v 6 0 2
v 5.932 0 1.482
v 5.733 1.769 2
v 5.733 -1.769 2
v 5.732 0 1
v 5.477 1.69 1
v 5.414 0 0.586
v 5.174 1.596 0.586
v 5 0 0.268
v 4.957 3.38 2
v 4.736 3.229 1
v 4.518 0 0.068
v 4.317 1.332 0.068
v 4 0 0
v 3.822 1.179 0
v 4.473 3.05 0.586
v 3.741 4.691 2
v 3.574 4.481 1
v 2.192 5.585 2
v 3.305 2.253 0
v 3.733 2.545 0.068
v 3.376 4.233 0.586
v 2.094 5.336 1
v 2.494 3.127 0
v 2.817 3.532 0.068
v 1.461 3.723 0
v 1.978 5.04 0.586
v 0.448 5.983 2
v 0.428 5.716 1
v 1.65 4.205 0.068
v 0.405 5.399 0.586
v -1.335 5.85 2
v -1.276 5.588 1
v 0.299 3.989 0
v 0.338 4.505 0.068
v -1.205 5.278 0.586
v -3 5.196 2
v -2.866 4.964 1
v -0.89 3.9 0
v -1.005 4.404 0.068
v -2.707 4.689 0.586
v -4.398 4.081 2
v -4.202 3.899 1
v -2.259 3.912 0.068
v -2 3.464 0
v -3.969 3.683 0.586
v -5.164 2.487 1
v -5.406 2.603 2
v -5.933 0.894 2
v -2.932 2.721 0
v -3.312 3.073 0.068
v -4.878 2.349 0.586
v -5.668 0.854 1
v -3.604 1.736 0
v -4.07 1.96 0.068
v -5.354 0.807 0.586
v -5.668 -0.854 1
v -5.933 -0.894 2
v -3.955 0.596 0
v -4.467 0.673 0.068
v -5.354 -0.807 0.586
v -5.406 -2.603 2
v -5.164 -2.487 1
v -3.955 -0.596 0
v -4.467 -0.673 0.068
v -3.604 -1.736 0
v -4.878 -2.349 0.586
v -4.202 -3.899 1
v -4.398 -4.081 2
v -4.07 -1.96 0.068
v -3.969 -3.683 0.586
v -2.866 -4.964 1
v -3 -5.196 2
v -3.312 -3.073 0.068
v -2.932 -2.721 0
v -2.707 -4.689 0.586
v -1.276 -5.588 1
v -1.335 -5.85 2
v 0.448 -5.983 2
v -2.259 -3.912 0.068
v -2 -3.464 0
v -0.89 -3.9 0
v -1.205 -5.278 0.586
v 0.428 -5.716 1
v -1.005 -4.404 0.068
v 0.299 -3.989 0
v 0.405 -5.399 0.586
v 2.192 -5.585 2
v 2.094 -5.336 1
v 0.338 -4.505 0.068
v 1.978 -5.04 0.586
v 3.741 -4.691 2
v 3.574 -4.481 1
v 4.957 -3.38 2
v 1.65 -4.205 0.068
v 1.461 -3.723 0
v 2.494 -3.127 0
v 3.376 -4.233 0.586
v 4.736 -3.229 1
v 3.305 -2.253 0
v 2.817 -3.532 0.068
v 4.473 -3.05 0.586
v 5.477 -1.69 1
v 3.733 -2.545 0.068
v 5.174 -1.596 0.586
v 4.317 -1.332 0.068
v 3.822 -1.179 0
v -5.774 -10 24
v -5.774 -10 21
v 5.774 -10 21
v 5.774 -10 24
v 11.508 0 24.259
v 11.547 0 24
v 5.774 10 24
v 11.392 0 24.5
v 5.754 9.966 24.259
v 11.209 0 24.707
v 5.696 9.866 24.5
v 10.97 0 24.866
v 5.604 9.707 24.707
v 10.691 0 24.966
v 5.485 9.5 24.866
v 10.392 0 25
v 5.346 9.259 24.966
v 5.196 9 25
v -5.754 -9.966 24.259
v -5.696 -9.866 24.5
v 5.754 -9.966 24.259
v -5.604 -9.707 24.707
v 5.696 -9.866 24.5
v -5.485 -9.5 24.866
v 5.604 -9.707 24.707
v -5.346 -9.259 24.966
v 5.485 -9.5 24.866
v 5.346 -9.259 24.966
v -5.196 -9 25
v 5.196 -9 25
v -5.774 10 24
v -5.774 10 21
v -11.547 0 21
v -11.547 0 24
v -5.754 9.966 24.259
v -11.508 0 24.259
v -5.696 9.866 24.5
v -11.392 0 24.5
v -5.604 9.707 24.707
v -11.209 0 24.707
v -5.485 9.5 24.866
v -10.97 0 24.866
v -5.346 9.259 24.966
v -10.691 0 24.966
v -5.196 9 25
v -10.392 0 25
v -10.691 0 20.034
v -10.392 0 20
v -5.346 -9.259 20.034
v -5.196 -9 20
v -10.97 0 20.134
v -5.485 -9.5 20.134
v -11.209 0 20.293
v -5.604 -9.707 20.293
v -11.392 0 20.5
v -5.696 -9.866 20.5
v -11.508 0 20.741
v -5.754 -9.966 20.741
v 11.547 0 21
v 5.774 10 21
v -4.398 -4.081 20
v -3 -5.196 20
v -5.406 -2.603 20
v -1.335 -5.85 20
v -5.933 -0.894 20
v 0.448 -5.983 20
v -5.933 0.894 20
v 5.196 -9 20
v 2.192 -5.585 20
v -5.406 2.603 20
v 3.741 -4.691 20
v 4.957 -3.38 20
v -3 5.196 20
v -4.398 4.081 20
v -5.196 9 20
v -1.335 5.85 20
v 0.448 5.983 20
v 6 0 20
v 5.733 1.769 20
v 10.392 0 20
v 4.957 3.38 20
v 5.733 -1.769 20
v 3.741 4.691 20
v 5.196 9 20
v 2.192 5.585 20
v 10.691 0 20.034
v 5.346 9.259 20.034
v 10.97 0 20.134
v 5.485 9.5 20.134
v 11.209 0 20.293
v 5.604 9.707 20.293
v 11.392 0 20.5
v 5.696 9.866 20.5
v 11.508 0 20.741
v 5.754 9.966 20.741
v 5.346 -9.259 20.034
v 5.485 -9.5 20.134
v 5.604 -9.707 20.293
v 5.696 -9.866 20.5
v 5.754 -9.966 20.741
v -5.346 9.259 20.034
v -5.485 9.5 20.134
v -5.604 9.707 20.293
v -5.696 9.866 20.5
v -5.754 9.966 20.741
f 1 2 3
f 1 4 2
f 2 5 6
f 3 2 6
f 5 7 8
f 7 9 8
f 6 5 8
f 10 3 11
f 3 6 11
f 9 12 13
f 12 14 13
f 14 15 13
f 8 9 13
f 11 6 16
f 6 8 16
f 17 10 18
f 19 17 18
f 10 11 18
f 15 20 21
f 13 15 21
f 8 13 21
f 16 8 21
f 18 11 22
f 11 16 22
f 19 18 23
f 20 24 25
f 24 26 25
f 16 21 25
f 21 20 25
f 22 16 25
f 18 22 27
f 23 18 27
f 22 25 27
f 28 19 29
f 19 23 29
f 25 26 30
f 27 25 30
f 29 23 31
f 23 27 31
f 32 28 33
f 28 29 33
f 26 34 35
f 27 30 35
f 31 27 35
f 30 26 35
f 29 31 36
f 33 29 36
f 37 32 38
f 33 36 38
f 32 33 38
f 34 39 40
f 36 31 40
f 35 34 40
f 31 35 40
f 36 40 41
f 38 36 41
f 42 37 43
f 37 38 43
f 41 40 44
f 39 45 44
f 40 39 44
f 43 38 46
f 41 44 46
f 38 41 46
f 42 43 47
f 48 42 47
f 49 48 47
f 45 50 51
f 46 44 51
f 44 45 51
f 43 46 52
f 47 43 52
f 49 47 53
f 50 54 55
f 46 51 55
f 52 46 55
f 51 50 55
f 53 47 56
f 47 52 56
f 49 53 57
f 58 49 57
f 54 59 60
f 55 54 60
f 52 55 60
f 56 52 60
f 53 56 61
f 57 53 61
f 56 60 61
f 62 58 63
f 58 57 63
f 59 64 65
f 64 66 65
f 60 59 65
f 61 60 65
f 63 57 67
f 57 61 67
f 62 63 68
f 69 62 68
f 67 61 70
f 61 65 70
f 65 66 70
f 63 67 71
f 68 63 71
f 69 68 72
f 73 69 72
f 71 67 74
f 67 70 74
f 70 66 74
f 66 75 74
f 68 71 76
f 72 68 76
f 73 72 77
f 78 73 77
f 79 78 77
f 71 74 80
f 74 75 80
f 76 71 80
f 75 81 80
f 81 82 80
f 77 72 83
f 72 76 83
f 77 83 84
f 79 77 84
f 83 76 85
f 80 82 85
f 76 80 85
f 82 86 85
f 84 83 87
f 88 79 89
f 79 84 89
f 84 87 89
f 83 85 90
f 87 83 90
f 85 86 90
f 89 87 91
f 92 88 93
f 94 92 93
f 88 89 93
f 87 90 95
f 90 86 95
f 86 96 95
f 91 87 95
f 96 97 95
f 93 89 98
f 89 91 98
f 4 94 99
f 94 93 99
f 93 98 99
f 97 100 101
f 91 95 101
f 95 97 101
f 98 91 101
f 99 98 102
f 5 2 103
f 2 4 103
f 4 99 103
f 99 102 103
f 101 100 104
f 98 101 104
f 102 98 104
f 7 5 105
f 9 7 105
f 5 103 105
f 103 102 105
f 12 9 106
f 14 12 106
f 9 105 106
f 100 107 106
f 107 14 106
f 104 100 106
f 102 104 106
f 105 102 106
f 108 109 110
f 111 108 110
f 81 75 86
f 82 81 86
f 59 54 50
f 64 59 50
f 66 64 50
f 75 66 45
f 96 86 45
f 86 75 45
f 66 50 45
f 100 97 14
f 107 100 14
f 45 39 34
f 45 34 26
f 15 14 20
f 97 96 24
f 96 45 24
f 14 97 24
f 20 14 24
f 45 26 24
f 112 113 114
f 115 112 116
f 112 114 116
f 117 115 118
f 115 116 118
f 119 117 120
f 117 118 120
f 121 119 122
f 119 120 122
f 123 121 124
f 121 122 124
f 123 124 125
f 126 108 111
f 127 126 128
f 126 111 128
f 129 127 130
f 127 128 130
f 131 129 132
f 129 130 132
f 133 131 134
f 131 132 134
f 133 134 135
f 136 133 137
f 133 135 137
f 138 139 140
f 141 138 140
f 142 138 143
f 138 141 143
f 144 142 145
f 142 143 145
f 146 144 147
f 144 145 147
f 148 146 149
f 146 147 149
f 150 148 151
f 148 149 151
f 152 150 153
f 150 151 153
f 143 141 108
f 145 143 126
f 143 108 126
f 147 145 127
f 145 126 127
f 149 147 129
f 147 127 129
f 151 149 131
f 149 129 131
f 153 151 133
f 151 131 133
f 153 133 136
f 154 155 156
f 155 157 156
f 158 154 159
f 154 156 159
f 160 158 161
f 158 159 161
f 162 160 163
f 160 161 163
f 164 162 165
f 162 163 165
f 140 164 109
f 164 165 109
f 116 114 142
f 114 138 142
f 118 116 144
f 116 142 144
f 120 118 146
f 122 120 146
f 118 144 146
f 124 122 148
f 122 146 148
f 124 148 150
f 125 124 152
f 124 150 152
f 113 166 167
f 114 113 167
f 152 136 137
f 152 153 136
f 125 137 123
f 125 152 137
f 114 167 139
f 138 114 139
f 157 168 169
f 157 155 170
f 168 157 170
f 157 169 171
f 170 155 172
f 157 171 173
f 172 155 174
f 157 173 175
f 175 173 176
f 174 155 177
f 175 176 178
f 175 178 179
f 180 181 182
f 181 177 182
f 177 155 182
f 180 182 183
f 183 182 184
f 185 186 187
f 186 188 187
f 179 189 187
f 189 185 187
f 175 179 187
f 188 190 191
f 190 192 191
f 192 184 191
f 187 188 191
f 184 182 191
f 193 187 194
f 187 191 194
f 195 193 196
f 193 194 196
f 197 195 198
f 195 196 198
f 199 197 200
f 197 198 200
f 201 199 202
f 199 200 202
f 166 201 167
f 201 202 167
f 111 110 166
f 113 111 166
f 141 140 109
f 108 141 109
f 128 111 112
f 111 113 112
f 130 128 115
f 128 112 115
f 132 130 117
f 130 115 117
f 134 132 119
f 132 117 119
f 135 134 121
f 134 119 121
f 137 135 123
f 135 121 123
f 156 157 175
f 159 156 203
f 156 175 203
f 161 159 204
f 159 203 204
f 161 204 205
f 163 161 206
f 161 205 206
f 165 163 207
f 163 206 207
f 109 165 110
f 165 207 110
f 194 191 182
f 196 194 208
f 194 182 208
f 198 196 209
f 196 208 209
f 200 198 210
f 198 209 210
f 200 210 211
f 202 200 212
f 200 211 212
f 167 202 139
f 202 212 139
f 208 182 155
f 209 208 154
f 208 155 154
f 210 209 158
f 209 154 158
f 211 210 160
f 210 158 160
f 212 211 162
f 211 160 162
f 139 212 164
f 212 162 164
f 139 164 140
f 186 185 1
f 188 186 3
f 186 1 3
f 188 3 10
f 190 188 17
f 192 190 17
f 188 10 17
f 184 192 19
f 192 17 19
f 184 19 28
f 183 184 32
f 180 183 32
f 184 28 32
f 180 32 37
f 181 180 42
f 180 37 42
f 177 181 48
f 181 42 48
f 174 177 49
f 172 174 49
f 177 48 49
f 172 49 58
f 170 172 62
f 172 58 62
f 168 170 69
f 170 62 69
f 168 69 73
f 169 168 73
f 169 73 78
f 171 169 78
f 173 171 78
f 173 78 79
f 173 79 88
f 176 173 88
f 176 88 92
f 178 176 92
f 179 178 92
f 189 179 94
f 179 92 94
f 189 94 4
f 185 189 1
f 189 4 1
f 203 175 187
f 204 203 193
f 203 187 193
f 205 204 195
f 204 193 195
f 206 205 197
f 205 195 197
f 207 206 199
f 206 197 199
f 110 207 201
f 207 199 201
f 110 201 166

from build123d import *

# Parameters (mm, degrees)
SKETCH_1_R      = 6
EXTRUDE_1_DEPTH = 20
EXTRUDE_2_DEPTH = 5
FILLET_1_R      = 2
FILLET_2_R      = 1


with BuildPart() as part:
    # 草图1 → 凸台-拉伸1 (new body)
    with BuildSketch(Plane.XY):
        Circle(SKETCH_1_R)
    extrude(amount=EXTRUDE_1_DEPTH)

    # 草图2 → 凸台-拉伸2 (add)
    with BuildSketch(Plane.XY.offset(20)):
        Polygon((5.773502692, -10), (11.547005384, 0), (5.773502692, 10), (-5.773502692, 10), (-11.547005384, 0), (-5.773502692, -10), align=None)
    extrude(amount=EXTRUDE_2_DEPTH)

    # 圆角1
    fillet_1_edges = [part.edges().sort_by_distance(p)[0] for p in [
        (-6, 0, 0),
    ]]
    fillet(fillet_1_edges, radius=FILLET_1_R)

    # 圆角2
    fillet_2_edges = [part.edges().sort_by_distance(p)[0] for p in [
        (0, -10, 20),
        (8.660254038, -5, 20),
        (8.660254038, 5, 20),
        (0, 10, 20),
        (-8.660254038, 5, 20),
        (-8.660254038, -5, 20),
        (0, -10, 25),
        (8.660254038, -5, 25),
        (8.660254038, 5, 25),
        (0, 10, 25),
        (-8.660254038, 5, 25),
        (-8.660254038, -5, 25),
    ]]
    fillet(fillet_2_edges, radius=FILLET_2_R)


solid = part.part
